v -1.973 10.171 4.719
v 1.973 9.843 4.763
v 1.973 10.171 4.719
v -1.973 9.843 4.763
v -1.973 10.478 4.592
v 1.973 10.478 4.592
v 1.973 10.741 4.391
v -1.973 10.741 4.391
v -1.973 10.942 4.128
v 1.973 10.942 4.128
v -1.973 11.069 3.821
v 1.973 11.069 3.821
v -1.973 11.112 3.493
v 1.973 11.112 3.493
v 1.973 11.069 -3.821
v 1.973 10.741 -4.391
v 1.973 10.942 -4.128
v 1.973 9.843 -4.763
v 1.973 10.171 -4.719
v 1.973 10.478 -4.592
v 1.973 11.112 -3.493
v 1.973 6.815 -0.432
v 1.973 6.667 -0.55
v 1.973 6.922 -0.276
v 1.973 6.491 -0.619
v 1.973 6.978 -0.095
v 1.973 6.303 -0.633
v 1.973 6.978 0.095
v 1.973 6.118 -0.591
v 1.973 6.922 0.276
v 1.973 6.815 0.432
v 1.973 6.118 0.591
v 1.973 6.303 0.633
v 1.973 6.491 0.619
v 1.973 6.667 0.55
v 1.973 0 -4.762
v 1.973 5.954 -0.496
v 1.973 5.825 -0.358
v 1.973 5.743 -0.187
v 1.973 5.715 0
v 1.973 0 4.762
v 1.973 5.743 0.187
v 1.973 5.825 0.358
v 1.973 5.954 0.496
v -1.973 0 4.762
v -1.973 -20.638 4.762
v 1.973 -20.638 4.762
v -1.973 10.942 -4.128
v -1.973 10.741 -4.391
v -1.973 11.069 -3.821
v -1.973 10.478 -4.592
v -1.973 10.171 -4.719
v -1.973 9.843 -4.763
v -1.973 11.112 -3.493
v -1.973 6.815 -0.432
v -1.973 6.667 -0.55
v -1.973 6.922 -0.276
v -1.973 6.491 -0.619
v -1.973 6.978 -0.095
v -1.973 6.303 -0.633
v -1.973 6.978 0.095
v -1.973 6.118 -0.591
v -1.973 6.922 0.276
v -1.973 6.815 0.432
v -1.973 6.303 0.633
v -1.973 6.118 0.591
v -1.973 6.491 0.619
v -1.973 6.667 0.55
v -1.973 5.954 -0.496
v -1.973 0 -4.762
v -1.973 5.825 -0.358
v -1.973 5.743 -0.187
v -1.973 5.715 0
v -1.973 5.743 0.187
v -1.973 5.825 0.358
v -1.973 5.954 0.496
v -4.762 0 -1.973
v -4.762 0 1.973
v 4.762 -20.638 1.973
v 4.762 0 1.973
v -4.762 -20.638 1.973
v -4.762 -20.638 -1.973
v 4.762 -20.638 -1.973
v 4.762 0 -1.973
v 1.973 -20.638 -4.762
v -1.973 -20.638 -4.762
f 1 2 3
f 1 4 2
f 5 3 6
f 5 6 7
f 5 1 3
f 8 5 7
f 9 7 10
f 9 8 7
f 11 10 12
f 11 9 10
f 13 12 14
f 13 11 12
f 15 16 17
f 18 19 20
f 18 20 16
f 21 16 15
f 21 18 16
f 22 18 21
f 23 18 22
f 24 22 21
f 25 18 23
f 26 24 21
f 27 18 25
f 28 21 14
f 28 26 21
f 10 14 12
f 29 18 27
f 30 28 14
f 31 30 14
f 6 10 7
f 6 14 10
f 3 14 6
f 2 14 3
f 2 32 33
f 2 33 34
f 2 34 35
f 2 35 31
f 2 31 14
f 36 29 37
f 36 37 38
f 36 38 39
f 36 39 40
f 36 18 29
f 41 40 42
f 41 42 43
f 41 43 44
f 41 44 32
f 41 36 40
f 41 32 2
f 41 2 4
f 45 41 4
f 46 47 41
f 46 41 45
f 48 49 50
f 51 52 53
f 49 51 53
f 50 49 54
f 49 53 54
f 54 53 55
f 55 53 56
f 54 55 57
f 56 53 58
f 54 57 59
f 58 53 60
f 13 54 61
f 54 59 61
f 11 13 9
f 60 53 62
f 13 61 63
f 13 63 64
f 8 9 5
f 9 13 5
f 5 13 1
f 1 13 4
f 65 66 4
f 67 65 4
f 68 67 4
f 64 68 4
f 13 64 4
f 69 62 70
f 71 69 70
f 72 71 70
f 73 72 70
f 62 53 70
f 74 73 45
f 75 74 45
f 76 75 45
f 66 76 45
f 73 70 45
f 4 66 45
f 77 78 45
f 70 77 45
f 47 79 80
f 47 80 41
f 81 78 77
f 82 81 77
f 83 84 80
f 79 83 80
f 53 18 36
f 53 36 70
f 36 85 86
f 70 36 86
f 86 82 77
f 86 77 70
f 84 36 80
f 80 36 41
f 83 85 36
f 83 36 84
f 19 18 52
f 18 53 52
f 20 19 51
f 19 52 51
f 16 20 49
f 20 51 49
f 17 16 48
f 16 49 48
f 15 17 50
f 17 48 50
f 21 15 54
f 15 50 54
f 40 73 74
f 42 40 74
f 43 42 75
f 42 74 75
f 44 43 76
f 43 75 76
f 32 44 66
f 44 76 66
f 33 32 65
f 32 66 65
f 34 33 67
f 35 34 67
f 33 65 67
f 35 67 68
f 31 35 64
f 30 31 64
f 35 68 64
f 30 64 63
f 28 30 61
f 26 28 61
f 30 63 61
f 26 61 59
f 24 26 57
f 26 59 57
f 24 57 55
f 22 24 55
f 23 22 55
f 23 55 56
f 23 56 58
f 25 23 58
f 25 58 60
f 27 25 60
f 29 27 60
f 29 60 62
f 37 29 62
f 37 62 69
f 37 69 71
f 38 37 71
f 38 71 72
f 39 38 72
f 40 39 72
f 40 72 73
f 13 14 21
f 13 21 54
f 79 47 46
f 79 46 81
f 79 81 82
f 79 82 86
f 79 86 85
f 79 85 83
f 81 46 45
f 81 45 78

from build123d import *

# Parameters (mm, degrees)
F1_DEPTH = 20.6375
F2_W     = 3.945384
F2_H     = 9.525
F3_DEPTH = 11.1125
F4_R     = 1.27
F6_D     = 1.27
F6_DEPTH = 25.4


with BuildPart() as f1:
    # F0 (on Front) → F1 (new body)
    with BuildSketch(Plane.XZ):
        Polygon((1.972692, 4.7625), (-1.972692, 4.7625), (-4.7625, 1.972692), (-4.7625, -1.972692), (-1.972692, -4.7625), (1.972692, -4.7625), (4.7625, -1.972692), (4.7625, 1.972692), align=None)
    extrude(amount=F1_DEPTH)

    # F2 (on face) → F3 (join)
    with BuildSketch(Plane(origin=(0, 0, 0), x_dir=(-1, 0, 0), z_dir=(0, 1, 0))):
        Rectangle(F2_W, F2_H)
    extrude(amount=F3_DEPTH)

    # F4
    f4_edges = [f1.edges().sort_by_distance(p)[0] for p in [
        (0, 11.1125, 4.7625),
        (0, 11.1125, -4.7625),
    ]]
    fillet(f4_edges, radius=F4_R)

    # F6
    with Locations(Plane.YZ.offset(1.972692)):
        with Locations((6.35, 0)):
            Hole(F6_D / 2, depth=F6_DEPTH)


solid = f1.part
